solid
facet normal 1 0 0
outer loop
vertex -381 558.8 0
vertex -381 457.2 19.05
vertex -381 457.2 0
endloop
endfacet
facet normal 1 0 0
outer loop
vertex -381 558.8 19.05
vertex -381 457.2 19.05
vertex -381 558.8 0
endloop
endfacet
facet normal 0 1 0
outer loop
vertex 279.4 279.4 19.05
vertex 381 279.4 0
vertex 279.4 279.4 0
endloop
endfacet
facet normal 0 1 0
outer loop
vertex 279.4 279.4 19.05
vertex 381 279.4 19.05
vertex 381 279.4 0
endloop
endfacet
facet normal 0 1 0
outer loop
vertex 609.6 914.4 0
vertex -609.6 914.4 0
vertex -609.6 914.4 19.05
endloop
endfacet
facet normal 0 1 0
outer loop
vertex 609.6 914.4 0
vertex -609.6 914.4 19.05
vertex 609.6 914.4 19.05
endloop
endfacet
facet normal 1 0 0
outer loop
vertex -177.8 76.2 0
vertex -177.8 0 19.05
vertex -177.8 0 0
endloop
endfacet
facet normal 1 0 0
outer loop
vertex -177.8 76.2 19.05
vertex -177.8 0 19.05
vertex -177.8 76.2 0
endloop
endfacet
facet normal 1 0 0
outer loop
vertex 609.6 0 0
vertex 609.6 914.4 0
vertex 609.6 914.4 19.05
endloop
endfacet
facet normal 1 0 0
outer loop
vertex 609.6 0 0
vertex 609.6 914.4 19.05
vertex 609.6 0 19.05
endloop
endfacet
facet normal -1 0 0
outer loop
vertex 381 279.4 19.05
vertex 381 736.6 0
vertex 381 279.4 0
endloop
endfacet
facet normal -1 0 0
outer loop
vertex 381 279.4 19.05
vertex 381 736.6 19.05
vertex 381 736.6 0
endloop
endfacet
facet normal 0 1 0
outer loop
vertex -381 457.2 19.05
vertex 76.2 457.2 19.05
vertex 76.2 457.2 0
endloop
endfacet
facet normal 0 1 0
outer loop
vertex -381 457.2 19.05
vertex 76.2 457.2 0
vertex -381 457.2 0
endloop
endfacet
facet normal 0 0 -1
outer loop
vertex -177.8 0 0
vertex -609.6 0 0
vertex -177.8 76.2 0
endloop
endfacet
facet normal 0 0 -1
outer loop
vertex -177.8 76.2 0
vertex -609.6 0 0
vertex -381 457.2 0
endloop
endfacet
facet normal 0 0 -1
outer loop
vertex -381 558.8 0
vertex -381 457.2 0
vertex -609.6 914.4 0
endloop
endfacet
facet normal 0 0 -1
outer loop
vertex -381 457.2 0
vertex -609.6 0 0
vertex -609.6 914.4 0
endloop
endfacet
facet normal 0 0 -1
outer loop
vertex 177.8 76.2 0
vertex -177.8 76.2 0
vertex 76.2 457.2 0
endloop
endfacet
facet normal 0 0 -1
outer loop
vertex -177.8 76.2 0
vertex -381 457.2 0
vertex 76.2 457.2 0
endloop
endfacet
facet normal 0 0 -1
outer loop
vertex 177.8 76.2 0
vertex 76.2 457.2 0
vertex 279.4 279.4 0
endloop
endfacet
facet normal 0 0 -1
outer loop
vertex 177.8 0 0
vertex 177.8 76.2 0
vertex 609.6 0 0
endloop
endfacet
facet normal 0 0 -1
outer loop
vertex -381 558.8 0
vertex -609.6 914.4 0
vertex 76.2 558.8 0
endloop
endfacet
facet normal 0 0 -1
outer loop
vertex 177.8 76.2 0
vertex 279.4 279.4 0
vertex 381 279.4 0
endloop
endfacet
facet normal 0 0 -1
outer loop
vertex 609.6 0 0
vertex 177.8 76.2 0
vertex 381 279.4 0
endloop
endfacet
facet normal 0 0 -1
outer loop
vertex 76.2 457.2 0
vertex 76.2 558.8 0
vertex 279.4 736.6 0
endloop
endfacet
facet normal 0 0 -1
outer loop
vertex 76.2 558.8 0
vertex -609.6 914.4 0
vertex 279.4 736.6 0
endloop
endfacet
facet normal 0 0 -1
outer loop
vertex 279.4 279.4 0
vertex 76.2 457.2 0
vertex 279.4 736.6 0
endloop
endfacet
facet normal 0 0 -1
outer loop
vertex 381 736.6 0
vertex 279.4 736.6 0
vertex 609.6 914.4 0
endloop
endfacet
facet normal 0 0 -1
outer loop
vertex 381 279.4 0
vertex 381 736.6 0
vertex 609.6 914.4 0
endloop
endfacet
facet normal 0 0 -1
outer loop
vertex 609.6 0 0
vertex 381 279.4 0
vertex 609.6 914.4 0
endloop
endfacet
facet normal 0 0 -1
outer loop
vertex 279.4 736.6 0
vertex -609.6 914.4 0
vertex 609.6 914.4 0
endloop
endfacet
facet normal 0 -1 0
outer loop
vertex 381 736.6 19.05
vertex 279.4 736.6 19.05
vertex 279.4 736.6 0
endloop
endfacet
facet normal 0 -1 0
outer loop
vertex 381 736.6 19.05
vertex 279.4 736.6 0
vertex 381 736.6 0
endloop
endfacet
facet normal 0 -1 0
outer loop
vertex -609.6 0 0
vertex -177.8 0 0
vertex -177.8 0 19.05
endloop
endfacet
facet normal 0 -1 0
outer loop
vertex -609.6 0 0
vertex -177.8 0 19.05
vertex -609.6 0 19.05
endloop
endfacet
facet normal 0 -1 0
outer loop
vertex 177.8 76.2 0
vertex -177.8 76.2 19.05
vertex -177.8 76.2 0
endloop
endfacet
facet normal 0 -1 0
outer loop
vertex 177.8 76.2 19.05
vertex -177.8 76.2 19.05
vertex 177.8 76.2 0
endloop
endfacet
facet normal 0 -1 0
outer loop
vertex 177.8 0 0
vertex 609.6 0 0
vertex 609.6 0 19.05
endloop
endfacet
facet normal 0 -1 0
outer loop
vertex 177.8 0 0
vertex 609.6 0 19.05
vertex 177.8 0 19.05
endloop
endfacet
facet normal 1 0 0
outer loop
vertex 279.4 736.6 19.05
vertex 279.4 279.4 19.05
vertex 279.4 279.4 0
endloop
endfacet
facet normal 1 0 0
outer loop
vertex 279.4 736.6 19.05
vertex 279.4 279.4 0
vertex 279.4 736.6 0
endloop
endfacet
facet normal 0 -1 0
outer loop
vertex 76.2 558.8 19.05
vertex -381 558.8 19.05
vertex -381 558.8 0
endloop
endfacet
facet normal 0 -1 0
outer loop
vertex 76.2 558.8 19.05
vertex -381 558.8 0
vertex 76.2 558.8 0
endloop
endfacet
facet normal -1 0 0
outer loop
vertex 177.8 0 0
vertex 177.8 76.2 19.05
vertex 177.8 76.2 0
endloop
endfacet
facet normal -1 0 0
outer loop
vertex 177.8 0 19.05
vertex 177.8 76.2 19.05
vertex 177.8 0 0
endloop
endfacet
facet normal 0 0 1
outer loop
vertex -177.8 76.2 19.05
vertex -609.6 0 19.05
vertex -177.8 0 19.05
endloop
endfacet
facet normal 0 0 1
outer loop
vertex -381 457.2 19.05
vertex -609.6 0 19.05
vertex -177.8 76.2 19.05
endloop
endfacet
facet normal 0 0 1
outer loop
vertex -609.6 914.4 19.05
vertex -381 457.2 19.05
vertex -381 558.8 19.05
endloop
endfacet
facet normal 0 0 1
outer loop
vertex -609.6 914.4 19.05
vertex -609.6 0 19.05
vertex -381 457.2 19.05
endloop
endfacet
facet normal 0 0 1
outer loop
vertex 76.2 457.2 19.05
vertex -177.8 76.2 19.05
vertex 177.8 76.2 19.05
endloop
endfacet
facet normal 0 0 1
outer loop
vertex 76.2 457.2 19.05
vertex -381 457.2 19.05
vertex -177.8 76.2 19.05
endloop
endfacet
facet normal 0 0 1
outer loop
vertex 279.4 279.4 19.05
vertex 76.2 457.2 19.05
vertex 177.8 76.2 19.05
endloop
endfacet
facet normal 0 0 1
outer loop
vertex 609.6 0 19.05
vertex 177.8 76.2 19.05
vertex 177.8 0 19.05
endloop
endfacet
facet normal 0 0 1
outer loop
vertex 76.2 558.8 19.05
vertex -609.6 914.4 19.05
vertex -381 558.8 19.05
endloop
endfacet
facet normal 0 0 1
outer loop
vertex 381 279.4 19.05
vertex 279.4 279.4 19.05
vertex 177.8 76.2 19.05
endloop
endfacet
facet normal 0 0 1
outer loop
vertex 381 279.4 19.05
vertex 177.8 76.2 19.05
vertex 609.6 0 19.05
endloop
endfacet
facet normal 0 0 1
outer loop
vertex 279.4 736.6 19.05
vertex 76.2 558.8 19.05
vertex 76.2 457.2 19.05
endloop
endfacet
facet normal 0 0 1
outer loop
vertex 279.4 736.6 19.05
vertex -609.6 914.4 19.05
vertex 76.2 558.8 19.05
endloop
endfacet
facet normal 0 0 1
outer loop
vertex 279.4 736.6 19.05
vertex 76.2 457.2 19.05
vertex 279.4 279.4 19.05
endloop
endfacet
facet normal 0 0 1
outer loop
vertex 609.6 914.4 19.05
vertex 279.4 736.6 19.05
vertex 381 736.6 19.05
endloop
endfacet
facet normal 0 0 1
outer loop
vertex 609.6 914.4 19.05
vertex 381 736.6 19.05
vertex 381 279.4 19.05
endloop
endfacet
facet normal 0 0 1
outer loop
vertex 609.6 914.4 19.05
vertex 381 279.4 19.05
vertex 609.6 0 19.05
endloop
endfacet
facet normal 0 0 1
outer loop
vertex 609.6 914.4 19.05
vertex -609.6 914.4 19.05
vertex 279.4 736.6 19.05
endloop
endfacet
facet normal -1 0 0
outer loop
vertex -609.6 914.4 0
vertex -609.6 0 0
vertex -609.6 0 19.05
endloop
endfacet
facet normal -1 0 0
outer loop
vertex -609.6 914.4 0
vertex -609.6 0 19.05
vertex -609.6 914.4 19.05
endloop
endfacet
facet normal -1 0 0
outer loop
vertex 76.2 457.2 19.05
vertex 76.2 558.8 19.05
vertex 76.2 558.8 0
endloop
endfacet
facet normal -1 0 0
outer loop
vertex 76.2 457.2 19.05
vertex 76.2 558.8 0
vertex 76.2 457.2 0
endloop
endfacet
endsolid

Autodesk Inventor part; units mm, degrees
ref_plane "YZ Plane" through (0, 0, 0) normal (1, 0, 0) x (0, 1, 0)
ref_plane "XZ Plane" through (0, 0, 0) normal (0, 1, 0) x (-1, 0, 0)
ref_plane "XY Plane" through (0, 0, 0) normal (0, 0, 1) x (1, 0, 0)
sketch "Sketch1" plane through (0, 0, 0) normal (0, 0, 1) x (1, 0, 0)
  line L0 (-609.6, 914.4) -> (609.6, 914.4)
  line L1 (609.6, 914.4) -> (609.6, 0)
  line L2 (609.6, 0) -> (-609.6, 0)
  line L3 (-609.6, 0) -> (-609.6, 914.4)
  point P0 (0, 0)
  dimension "d0" = 1219.2
  dimension "d1" = 914.4
  dimension "d2" = 914.4
  dimension "d3" = 609.6
extrude "Plywood" add sketch "Sketch1" along normal blind 19.05
sketch "Sketch2" plane through (0, 0, 19.05) normal (0, 0, 1) x (1, 0, 0)
  line L0 (-177.8, 76.2) -> (177.8, 76.2)
  line L1 (177.8, 76.2) -> (177.8, 0)
  line L2 (177.8, 0) -> (-177.8, 0)
  line L3 (-177.8, 0) -> (-177.8, 76.2)
  line L4 (-609.6, 0) -> (609.6, 0) projected
  line L5 (-381, 558.8) -> (76.2, 558.8)
  line L6 (76.2, 558.8) -> (76.2, 457.2)
  line L7 (76.2, 457.2) -> (-381, 457.2)
  line L8 (-381, 457.2) -> (-381, 558.8)
  line L9 (-381, 508) -> (76.2, 508) construction
  line L10 (279.4, 736.6) -> (381, 736.6)
  line L11 (381, 736.6) -> (381, 279.4)
  line L12 (381, 279.4) -> (279.4, 279.4)
  line L13 (279.4, 279.4) -> (279.4, 736.6)
  line L14 (76.2, 508) -> (279.4, 508)
  point P0 (0, 0)
  dimension "d6" = 355.6
  dimension "d7" = 76.2
  dimension "d8" = 177.8
  dimension "d9" = 457.2
  dimension "d10" = 381
  dimension "d11" = 101.6
  dimension "d12" = 508
  dimension "d15" = 101.6
  dimension "d16" = 457.2
  dimension "d17" = 203.2
  dimension "d18" = 762
extrude "SLOTS" cut sketch "Sketch2" against normal through all
equation "\"d2\" = d1"
equation "\"d3\" = 0.5 * d0"
equation "\"d8\" = 0.5 * d6"
equation "\"d10\" = 0.5 * d18"
equation "\"d15\" = d11"
equation "\"d16\" = d9"
properties part number "Plywood"
